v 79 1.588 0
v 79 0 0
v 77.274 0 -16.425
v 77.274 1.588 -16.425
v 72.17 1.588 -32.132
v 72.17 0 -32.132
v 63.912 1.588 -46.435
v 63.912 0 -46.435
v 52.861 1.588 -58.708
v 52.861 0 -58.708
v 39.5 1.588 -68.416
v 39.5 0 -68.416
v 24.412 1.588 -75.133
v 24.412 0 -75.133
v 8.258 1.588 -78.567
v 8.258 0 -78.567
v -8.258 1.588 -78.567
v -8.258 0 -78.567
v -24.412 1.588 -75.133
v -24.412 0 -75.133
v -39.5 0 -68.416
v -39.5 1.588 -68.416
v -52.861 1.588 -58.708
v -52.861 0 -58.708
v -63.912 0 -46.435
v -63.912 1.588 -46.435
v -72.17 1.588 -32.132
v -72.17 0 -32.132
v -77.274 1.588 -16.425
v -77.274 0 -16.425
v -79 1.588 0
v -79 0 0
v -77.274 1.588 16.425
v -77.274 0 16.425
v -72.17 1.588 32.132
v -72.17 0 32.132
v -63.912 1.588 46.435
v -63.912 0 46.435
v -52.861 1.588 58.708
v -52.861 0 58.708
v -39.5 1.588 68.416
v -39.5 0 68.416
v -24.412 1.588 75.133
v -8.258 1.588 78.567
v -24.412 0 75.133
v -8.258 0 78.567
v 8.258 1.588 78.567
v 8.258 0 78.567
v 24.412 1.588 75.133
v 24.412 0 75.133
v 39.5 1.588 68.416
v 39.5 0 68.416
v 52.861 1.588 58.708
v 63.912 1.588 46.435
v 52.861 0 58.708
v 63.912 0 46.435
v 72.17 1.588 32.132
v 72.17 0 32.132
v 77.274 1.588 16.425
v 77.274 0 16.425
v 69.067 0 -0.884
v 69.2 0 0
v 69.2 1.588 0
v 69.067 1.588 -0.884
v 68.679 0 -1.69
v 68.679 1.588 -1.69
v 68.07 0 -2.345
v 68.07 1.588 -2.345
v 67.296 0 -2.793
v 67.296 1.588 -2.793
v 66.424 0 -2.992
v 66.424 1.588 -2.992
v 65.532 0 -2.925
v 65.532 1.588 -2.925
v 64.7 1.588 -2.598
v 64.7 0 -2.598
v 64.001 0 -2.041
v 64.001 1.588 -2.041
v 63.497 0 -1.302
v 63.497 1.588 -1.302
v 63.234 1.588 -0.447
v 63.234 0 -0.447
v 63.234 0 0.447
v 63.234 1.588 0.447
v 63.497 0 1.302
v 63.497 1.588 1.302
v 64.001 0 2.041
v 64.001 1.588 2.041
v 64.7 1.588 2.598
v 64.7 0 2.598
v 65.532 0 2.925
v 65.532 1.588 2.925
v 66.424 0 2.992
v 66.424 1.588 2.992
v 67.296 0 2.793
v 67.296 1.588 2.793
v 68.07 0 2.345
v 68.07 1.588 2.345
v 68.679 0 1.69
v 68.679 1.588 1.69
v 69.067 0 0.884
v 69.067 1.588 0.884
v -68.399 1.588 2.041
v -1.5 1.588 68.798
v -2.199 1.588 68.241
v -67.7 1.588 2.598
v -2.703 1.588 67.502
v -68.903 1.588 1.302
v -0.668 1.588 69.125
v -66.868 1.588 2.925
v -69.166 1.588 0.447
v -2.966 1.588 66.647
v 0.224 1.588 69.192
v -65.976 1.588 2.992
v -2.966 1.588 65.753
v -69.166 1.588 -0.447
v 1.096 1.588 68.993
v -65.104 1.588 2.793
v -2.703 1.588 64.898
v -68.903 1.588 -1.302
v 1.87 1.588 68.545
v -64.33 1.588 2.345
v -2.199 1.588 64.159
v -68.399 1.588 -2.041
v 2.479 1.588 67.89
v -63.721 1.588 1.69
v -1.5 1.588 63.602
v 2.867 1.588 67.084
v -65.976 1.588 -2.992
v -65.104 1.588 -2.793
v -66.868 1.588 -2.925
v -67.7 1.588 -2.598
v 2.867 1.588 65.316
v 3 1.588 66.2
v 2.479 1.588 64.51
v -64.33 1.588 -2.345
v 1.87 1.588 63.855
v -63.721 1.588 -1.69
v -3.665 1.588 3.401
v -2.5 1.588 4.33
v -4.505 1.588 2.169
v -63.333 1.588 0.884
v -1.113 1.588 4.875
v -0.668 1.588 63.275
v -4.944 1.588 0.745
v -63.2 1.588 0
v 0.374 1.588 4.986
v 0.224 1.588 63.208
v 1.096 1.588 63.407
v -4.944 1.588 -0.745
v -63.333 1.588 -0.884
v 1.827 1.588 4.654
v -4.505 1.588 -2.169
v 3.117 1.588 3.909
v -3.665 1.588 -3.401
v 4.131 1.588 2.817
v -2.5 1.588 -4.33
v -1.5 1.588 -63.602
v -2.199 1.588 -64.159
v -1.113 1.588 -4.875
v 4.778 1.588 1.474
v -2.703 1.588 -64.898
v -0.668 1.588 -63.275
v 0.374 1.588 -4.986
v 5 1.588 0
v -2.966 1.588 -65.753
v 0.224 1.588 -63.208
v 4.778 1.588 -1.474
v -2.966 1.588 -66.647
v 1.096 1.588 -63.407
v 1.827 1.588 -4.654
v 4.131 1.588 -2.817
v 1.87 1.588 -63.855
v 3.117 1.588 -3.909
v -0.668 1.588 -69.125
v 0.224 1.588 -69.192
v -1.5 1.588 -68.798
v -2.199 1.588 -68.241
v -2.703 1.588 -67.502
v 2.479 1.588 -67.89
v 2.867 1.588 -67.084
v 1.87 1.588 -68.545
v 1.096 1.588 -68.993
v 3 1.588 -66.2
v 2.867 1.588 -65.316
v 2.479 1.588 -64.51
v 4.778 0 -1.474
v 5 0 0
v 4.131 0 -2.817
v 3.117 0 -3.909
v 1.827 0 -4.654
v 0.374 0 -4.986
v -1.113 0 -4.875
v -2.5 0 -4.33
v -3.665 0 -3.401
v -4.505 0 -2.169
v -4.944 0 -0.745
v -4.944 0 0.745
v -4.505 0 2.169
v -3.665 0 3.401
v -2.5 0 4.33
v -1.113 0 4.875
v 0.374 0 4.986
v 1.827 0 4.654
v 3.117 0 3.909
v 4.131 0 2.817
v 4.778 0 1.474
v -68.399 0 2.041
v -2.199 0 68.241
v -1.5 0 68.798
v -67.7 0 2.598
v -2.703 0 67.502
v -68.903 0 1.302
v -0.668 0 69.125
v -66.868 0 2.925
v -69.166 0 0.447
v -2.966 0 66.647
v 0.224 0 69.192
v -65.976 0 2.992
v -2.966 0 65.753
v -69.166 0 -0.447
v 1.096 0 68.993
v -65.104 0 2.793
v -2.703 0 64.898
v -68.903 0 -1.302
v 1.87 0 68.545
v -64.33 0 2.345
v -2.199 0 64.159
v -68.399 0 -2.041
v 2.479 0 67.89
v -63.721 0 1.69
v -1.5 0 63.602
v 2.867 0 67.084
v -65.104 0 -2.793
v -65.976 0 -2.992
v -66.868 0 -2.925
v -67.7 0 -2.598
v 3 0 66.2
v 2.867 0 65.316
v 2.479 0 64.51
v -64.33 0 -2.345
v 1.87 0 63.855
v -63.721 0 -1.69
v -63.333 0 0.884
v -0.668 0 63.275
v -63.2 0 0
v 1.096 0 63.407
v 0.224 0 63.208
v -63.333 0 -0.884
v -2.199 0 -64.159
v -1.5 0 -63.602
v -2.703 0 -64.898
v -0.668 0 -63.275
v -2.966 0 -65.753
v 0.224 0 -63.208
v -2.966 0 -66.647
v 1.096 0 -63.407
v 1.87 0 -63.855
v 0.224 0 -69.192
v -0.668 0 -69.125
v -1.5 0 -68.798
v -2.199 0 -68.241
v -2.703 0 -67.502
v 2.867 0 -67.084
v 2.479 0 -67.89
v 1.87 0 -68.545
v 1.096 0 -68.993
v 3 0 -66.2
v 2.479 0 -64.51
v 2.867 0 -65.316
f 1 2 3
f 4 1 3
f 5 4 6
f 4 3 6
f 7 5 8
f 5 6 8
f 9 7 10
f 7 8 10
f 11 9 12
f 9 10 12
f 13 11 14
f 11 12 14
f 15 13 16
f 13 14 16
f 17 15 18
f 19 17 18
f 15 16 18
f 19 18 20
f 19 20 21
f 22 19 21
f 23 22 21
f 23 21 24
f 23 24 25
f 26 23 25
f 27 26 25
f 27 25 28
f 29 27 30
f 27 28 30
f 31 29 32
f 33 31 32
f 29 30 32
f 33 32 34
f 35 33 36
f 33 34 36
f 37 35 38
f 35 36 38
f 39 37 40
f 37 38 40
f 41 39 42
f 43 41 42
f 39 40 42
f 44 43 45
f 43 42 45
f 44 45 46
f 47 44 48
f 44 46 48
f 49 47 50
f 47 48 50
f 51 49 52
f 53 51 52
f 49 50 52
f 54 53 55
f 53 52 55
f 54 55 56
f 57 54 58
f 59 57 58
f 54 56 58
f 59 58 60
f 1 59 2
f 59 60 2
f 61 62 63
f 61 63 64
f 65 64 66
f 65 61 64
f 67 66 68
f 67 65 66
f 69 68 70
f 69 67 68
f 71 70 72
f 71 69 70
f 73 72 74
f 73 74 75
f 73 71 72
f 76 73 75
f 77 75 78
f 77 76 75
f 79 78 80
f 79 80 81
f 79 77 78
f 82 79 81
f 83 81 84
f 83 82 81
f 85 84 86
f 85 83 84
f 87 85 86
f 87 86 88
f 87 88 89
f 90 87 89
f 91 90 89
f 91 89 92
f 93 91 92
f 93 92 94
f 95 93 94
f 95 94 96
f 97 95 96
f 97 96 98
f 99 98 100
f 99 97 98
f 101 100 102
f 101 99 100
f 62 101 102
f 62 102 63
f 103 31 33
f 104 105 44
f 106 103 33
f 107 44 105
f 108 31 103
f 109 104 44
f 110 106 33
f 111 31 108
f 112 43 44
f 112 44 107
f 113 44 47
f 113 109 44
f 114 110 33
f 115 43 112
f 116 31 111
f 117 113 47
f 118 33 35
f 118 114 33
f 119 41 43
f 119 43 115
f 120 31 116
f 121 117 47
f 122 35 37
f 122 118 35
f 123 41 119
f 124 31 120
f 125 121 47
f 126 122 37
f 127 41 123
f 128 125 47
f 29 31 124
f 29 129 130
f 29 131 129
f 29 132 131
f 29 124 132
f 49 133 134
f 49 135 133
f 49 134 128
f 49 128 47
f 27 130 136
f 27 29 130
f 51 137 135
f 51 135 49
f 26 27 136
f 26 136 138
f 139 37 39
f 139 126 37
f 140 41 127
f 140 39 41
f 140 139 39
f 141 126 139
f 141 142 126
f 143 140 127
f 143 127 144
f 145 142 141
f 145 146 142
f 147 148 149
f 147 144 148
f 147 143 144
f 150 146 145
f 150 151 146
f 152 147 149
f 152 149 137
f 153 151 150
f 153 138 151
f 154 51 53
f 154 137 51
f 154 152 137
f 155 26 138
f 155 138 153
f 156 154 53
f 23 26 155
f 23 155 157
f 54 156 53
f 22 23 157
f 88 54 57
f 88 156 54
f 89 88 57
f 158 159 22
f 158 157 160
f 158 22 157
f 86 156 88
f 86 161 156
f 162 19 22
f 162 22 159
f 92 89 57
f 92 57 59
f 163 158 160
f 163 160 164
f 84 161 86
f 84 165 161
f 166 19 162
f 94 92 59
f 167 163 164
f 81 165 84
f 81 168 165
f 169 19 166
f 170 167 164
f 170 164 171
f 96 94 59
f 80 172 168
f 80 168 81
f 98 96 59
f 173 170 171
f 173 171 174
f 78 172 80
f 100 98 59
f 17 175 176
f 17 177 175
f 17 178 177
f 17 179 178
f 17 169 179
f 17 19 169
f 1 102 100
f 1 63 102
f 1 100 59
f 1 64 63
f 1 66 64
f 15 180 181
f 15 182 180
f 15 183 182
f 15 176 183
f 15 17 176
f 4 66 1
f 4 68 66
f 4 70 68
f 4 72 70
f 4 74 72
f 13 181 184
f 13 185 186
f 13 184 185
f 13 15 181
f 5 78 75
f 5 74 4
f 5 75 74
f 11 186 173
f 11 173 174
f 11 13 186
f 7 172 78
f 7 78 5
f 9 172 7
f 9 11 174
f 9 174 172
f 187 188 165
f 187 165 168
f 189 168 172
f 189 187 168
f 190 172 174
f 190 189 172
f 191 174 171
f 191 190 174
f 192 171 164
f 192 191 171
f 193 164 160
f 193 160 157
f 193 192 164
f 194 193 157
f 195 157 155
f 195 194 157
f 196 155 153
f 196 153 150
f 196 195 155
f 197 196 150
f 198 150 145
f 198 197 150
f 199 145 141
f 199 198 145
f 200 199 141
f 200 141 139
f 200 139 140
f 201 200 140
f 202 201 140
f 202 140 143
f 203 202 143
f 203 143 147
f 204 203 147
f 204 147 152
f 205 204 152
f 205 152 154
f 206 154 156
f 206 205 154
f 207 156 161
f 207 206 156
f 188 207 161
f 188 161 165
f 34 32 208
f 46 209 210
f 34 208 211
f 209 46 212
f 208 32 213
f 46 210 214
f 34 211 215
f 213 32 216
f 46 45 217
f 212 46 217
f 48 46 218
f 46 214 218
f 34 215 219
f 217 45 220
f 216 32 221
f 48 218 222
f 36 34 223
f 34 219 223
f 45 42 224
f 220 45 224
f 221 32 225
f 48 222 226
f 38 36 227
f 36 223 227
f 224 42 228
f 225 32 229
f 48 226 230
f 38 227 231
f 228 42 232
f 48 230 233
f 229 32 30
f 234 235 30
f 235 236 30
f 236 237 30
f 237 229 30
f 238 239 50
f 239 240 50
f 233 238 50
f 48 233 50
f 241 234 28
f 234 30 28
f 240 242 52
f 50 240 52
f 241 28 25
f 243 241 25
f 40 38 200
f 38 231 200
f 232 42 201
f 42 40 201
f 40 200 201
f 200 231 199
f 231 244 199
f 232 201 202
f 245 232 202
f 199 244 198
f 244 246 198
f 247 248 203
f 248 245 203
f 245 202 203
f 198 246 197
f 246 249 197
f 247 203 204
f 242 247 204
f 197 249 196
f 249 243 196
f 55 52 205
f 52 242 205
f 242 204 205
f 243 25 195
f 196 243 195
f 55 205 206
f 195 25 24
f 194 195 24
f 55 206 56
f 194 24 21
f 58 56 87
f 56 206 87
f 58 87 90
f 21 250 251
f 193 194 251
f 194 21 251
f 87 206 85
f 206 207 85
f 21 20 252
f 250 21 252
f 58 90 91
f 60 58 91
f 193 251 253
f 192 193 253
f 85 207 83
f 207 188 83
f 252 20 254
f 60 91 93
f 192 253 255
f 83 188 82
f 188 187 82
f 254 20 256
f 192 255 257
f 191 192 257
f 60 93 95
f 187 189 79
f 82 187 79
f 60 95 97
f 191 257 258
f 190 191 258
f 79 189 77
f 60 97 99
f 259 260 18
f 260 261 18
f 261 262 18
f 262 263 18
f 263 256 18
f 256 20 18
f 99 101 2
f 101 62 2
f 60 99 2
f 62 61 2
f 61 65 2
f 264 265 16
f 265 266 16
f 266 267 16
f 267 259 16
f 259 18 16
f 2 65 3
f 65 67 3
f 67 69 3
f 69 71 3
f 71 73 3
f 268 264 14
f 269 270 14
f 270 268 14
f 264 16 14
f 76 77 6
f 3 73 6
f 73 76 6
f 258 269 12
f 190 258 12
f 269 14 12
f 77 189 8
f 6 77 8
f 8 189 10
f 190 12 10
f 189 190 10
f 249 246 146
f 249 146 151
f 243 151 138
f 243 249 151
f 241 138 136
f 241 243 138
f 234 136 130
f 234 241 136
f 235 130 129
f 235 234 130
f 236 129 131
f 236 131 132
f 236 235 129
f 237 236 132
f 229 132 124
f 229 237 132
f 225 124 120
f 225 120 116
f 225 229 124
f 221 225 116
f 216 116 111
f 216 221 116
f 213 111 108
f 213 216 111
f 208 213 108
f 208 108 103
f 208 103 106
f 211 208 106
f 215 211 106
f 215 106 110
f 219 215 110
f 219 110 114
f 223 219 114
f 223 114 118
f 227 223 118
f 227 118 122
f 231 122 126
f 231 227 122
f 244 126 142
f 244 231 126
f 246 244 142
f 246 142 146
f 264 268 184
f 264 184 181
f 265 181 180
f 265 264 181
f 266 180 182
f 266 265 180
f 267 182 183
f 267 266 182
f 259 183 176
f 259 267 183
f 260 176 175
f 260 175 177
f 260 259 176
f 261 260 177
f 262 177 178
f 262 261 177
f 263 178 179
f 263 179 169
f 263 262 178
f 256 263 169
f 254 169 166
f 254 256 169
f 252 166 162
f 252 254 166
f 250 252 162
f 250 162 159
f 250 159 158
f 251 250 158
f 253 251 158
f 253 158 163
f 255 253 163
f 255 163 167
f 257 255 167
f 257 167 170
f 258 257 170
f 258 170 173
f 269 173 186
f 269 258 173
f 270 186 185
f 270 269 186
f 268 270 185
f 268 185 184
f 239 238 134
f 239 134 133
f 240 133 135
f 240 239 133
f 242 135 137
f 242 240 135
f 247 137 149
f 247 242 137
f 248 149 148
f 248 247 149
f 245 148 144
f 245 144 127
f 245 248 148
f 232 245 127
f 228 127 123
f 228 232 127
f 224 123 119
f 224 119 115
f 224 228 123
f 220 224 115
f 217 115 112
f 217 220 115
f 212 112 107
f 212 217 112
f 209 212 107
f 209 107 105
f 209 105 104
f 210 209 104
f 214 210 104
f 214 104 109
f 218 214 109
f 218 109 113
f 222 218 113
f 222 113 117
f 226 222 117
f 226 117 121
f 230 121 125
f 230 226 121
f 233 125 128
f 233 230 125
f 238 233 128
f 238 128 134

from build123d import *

# Parameters (mm, degrees)
SKETCH1_R           = 79
SKETCH1_R_2         = 3
SKETCH1_R_3         = 5
BOSS_EXTRUDE1_DEPTH = 1.5875


with BuildPart() as part:
    # Sketch1 → Boss-Extrude1 (new body)
    with BuildSketch(Plane(origin=(0, 0, 0), x_dir=(1, 0, 0), z_dir=(0, 1, 0))):
        Circle(SKETCH1_R)
        with Locations((0, 66.2)):
            Circle(SKETCH1_R_2, mode=Mode.SUBTRACT)
        with Locations((66.2, 0)):
            Circle(SKETCH1_R_2, mode=Mode.SUBTRACT)
        with Locations((0, -66.2)):
            Circle(SKETCH1_R_2, mode=Mode.SUBTRACT)
        with Locations((-66.2, 0)):
            Circle(SKETCH1_R_2, mode=Mode.SUBTRACT)
        Circle(SKETCH1_R_3, mode=Mode.SUBTRACT)
    extrude(amount=BOSS_EXTRUDE1_DEPTH)


solid = part.part
